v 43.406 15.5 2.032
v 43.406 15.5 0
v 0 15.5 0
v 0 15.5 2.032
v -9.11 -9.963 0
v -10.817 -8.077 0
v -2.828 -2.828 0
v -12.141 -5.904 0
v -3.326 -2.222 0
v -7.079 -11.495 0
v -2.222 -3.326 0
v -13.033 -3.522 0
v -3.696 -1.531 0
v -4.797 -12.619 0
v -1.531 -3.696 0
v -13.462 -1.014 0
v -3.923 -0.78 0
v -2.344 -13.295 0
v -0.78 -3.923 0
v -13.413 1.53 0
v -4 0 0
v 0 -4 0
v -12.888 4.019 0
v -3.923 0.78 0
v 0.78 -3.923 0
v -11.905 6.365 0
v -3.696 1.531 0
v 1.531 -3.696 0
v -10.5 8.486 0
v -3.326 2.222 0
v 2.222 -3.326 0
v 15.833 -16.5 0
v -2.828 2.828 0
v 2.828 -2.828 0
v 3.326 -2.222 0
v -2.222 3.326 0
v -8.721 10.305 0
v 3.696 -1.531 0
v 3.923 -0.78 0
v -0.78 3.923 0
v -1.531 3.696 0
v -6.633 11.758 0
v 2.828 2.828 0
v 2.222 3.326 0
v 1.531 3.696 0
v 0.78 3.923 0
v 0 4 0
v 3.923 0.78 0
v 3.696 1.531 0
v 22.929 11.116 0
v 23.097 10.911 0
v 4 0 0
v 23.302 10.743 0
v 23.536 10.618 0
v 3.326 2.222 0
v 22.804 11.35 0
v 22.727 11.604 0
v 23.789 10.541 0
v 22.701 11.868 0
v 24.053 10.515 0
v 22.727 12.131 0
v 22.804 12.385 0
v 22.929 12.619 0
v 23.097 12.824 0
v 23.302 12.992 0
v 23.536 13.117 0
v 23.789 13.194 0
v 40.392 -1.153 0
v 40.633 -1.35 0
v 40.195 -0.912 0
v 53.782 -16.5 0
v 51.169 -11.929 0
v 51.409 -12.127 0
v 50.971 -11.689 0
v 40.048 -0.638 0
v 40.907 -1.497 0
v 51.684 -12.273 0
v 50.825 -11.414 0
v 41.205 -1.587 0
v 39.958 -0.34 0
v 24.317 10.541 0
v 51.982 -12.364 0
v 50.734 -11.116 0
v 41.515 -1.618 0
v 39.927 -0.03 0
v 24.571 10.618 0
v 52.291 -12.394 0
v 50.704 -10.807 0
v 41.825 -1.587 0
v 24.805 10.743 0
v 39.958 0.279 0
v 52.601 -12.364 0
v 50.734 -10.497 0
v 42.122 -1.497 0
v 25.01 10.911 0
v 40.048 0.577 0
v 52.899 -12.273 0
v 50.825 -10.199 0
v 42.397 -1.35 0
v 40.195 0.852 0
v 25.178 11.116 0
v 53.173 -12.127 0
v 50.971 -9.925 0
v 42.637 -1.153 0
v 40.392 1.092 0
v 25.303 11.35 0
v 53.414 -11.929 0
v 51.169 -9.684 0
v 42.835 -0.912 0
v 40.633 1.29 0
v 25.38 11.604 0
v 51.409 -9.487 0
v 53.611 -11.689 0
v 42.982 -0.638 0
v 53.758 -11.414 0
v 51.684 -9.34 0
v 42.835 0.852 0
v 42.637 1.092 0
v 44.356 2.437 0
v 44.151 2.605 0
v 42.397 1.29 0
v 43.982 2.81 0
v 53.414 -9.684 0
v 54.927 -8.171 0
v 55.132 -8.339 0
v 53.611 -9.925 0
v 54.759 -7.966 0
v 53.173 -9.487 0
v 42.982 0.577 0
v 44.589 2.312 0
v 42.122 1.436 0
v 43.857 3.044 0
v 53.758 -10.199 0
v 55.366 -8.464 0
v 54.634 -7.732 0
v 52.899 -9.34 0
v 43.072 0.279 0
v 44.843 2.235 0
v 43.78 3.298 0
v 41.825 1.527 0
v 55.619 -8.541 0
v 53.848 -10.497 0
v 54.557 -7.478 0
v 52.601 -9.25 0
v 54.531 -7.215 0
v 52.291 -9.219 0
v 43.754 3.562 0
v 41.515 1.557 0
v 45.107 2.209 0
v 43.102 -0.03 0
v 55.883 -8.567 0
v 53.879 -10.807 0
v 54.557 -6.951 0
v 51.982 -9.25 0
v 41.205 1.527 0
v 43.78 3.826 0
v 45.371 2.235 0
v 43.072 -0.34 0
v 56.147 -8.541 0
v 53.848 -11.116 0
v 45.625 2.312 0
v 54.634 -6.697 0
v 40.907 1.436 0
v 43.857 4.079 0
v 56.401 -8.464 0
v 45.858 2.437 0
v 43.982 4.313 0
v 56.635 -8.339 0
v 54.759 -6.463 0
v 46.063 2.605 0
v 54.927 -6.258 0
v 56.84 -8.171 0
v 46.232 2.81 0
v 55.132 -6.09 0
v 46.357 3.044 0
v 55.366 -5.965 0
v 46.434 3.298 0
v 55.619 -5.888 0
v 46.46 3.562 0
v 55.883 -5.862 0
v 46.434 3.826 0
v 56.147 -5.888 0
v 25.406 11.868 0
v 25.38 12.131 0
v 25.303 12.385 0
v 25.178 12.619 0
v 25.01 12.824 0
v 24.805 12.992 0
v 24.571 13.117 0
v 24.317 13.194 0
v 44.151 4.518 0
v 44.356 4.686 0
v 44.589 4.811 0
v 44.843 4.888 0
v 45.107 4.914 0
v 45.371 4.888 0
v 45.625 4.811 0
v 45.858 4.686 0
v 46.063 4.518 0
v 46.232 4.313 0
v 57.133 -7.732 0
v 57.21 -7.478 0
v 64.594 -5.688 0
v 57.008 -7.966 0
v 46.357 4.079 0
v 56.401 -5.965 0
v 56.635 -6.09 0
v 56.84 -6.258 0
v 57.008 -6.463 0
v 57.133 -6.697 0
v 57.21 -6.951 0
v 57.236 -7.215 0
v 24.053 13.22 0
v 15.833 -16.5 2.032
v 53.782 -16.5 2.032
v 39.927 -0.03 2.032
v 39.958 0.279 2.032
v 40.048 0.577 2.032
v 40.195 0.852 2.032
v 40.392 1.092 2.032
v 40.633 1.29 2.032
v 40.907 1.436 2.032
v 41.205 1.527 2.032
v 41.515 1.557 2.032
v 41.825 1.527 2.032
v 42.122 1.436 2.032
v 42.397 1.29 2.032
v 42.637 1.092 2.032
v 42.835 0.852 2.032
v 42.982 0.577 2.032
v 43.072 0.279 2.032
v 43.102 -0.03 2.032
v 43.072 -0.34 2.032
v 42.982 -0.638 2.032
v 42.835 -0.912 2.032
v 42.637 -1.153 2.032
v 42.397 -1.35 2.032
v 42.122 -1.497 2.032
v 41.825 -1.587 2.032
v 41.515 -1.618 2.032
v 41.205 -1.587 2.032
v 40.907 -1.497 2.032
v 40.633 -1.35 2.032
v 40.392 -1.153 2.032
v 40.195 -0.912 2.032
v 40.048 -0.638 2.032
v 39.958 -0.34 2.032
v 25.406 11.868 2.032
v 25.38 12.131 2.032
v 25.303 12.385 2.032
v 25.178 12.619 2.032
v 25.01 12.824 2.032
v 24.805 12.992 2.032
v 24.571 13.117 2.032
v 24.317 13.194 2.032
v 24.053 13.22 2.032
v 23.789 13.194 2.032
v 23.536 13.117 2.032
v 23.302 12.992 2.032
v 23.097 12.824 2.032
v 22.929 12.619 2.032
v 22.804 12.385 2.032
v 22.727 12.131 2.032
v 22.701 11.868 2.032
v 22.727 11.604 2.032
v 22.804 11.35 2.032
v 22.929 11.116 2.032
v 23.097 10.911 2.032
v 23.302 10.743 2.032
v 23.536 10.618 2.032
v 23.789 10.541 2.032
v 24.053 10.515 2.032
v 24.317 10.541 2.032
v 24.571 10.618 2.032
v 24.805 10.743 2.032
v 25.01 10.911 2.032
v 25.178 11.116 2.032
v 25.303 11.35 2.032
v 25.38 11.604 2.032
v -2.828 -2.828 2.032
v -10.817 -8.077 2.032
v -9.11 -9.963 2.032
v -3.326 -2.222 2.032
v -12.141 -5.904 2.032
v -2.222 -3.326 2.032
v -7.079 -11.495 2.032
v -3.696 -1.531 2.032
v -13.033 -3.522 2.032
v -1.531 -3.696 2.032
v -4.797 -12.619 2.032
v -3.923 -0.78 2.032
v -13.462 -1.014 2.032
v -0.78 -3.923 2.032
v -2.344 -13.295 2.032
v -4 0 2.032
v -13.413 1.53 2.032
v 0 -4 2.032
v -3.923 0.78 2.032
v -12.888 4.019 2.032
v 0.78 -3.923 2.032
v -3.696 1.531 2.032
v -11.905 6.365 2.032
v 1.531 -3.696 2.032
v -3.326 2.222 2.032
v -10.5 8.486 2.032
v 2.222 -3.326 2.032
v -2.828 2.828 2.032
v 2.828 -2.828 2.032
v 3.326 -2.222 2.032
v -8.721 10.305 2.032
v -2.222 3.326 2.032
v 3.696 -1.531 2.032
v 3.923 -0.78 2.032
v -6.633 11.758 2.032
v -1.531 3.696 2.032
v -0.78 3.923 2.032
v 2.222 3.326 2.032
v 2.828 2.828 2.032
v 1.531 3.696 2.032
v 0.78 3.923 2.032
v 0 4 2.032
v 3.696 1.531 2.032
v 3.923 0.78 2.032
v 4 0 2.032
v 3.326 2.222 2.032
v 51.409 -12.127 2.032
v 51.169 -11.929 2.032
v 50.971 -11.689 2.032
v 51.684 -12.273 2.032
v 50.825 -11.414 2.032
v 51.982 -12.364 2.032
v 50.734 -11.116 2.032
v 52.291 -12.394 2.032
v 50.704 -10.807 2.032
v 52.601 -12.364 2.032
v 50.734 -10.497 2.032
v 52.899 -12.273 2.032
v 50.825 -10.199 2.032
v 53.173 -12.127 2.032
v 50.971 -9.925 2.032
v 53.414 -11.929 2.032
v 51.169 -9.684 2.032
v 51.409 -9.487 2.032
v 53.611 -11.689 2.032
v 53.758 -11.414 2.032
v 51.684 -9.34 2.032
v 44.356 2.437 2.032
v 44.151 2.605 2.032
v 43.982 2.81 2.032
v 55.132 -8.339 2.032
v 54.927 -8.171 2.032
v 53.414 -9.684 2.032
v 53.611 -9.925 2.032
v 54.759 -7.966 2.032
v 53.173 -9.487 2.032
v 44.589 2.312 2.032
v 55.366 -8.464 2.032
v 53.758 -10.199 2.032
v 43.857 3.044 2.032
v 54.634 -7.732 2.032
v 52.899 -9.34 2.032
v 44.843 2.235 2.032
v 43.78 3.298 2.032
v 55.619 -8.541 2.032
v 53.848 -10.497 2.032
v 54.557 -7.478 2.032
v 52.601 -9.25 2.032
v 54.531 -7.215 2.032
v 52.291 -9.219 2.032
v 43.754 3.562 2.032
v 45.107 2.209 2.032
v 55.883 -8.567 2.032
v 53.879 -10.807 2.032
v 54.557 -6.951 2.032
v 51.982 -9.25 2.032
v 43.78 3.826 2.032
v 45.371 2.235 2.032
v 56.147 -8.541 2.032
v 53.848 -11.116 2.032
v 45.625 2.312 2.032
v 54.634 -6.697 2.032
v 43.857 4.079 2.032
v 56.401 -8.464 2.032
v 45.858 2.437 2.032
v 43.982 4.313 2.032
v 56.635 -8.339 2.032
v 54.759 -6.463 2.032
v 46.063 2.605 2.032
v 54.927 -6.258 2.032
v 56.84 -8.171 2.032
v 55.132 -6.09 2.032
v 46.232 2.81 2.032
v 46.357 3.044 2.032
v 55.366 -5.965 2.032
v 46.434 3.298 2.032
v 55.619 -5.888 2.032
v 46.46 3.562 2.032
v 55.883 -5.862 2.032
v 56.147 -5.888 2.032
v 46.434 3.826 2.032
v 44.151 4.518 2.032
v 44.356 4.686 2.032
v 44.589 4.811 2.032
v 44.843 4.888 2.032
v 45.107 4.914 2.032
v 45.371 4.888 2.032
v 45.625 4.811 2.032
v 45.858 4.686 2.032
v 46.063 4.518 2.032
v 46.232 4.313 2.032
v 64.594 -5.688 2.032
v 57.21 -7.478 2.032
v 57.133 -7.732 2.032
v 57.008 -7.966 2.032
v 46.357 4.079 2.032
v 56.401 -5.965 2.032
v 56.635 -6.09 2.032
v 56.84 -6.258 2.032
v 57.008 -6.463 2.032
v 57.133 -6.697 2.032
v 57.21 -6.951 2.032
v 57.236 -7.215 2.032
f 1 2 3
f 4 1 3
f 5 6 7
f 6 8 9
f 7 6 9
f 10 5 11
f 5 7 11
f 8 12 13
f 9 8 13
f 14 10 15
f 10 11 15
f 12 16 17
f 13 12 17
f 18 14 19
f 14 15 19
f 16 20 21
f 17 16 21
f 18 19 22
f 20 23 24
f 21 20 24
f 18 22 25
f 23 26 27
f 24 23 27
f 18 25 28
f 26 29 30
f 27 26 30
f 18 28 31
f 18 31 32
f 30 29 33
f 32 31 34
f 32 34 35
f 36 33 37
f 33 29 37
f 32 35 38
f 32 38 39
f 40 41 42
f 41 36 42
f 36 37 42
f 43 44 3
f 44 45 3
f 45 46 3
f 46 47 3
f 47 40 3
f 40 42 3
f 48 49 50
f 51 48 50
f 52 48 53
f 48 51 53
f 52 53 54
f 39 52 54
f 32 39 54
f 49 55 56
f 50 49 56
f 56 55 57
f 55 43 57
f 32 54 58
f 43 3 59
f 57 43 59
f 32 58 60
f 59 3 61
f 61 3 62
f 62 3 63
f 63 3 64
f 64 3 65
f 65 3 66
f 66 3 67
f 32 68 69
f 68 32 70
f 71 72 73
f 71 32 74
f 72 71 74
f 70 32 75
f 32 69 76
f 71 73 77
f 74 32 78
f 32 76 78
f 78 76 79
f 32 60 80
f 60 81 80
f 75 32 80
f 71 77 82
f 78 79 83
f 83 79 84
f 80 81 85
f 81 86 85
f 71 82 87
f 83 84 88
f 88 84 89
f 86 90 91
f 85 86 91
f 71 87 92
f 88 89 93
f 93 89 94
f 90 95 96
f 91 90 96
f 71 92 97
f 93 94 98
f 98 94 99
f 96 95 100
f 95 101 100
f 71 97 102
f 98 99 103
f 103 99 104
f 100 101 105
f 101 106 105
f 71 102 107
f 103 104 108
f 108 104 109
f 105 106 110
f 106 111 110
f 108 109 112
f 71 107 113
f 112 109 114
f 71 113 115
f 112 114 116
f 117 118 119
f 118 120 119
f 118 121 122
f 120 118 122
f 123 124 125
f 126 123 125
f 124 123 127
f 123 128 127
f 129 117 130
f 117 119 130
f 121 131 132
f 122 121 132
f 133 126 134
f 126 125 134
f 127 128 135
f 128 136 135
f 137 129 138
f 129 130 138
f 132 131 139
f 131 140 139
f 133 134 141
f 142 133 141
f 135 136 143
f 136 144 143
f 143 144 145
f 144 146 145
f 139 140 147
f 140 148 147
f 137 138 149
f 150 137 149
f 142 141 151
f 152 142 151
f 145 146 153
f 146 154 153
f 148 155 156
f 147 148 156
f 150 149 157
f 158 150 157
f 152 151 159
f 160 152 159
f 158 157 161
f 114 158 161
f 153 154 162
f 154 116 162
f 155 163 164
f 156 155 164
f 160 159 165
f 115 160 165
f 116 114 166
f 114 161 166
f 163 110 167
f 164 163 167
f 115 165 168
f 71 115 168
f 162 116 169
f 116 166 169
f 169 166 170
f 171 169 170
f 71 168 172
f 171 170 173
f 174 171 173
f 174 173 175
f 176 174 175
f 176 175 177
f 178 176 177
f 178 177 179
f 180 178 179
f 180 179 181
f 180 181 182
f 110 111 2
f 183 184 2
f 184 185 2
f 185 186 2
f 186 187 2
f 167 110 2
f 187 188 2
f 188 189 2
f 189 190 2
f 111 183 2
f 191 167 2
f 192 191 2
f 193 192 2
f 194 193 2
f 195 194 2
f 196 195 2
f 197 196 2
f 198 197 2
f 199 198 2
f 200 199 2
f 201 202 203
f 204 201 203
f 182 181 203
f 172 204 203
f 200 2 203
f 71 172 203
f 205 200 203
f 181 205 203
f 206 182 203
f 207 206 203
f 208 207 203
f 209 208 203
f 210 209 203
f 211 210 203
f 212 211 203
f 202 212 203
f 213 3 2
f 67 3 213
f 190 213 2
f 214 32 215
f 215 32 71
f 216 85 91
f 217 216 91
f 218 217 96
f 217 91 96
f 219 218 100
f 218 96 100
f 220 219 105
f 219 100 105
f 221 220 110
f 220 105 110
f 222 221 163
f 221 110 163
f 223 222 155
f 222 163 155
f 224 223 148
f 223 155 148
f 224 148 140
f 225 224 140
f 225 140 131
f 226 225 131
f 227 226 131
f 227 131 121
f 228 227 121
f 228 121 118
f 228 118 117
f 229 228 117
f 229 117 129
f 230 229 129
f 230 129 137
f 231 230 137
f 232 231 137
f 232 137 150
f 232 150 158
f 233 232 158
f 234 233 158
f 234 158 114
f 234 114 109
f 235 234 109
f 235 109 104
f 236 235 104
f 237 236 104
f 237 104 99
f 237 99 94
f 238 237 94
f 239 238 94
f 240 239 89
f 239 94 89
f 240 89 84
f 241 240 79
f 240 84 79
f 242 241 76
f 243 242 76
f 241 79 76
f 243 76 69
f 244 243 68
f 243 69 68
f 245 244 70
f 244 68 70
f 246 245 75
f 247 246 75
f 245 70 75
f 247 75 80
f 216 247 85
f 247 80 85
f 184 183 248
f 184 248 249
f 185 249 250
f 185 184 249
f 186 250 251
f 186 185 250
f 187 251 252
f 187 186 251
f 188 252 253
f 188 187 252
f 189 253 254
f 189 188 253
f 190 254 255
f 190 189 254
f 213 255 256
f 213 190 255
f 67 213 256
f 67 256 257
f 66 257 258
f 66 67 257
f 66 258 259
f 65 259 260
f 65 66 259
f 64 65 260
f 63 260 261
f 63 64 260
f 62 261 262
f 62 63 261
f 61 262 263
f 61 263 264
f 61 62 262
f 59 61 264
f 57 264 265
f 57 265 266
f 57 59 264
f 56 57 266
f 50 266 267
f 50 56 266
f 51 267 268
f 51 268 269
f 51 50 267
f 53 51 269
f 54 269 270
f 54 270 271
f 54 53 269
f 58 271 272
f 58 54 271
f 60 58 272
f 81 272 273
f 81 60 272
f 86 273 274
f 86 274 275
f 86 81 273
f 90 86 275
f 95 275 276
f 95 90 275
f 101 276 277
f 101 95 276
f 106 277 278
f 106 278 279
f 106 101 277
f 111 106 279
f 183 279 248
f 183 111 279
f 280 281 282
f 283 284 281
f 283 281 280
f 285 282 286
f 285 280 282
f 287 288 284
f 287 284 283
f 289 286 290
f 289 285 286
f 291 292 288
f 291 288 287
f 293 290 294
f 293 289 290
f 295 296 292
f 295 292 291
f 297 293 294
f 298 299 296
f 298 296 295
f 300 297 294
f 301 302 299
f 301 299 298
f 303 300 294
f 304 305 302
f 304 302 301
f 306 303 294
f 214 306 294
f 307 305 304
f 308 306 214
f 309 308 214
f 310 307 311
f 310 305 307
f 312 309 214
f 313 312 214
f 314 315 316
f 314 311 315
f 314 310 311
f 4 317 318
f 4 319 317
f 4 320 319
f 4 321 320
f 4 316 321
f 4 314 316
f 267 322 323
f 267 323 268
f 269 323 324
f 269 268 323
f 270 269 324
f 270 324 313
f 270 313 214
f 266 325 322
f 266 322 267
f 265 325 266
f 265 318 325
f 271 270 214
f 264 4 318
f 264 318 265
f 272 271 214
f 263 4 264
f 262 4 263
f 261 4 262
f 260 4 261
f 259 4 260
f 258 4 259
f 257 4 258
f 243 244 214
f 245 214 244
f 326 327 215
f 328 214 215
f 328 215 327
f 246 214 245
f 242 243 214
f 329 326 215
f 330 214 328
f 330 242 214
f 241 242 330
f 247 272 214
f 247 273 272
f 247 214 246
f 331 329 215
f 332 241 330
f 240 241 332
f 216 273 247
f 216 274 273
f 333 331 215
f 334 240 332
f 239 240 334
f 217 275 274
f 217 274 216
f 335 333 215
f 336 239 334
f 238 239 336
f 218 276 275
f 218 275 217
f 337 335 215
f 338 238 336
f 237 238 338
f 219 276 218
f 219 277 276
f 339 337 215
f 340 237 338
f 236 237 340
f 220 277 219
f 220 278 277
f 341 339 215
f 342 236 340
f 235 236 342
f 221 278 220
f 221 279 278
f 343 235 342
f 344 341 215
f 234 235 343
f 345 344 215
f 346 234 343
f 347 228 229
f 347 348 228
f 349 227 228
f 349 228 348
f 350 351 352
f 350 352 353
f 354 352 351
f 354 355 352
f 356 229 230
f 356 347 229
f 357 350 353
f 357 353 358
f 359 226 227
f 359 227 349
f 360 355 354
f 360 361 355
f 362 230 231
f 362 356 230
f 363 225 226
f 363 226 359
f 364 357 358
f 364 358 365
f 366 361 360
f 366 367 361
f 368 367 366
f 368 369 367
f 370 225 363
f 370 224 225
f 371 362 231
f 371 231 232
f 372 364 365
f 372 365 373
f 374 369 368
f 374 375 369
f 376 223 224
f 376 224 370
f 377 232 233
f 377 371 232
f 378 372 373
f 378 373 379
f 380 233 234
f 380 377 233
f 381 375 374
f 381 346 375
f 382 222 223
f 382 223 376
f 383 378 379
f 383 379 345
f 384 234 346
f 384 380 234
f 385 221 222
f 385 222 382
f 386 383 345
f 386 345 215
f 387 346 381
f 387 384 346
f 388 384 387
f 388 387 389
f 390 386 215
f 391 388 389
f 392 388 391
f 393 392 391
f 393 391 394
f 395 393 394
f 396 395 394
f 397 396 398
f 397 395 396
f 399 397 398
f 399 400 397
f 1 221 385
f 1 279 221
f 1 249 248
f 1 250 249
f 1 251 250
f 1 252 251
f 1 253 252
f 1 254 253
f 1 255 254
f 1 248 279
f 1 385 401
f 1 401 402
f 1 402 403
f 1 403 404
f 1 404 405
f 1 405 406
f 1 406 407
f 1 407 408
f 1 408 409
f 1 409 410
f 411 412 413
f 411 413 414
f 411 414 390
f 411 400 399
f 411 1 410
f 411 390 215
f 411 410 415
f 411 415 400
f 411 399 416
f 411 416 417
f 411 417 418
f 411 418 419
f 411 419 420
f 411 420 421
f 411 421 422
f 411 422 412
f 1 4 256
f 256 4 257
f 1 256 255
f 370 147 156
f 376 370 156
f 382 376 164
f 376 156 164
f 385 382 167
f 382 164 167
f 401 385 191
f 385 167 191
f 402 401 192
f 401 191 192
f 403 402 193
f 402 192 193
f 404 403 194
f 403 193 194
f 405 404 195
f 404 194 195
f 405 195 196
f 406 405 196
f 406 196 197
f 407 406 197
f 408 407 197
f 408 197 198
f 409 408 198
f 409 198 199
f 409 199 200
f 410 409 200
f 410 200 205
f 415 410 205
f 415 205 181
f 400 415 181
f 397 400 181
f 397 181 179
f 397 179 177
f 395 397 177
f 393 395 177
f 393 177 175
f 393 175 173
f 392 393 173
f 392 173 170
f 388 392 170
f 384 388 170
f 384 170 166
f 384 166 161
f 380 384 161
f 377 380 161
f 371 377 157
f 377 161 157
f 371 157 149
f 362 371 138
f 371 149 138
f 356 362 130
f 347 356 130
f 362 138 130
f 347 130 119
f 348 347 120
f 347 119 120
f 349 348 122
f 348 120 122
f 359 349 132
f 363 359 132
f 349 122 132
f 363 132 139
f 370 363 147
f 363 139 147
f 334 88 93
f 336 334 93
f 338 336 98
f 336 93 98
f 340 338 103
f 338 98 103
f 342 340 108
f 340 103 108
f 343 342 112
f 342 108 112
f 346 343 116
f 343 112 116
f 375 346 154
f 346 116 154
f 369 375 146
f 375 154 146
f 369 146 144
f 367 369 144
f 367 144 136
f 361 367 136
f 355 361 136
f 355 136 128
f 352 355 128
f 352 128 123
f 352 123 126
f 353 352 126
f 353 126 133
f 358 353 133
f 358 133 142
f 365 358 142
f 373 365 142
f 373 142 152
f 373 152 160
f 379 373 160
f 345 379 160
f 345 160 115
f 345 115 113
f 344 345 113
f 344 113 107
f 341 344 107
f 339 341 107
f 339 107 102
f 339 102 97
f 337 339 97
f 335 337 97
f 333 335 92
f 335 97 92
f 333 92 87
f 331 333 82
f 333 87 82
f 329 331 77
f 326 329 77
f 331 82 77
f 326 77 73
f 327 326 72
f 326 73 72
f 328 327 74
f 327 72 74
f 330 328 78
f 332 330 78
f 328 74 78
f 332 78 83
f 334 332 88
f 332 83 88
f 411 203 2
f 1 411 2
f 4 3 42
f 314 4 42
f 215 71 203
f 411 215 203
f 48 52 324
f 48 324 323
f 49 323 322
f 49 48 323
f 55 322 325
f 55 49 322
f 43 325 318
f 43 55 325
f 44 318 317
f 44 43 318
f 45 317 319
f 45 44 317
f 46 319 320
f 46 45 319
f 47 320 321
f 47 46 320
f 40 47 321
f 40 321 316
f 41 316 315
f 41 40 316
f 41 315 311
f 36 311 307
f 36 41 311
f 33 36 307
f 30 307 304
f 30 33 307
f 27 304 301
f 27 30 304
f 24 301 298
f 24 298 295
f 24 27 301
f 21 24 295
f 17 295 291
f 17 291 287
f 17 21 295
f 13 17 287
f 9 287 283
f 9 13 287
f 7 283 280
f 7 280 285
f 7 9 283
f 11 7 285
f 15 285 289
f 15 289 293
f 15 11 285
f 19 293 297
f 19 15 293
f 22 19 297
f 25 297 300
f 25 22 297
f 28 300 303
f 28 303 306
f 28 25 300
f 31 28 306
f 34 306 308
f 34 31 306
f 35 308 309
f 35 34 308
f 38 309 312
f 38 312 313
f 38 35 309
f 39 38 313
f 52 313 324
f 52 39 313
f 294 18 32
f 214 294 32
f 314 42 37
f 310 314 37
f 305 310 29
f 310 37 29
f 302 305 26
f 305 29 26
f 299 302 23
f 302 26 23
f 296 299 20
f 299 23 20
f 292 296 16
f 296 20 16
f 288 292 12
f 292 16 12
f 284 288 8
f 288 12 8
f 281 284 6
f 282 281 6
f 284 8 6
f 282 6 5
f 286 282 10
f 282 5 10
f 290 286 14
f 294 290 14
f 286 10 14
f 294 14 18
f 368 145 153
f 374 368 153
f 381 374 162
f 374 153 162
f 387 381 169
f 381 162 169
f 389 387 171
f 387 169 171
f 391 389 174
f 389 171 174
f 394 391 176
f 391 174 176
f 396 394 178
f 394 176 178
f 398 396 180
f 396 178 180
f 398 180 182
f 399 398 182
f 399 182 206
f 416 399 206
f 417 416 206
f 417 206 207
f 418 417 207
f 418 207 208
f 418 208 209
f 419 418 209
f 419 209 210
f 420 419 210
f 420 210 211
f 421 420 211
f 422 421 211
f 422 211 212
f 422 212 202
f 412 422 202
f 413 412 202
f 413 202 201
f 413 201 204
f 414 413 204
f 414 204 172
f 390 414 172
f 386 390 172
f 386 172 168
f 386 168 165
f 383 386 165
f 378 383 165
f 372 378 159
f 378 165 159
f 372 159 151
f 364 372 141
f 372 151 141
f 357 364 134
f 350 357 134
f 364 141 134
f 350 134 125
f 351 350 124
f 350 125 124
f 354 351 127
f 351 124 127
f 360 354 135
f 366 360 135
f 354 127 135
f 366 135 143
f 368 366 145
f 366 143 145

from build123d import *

# Parameters (mm, degrees)
SKETCH2_R           = 4
SKETCH2_R_2         = 1.35255
BOSS_EXTRUDE1_DEPTH = 2.032
SKETCH5_R           = 1.5875
SKETCH5_R_2         = 1.35255
CUT_EXTRUDE1_DEPTH  = 3.032


with BuildPart() as part:
    # Sketch2 → Boss-Extrude1 (new body)
    with BuildSketch(Plane.XY):
        with BuildLine():
            Line((64.594184148, -5.687884281), (43.406299867, 15.5))
            Line((43.406299867, 15.5), (0, 15.5))
            Line((0, 15.5), (-6.633092705, 11.758064516))
            ThreePointArc((-6.633092705, 11.758064516), (-13.306426587, -2.277940187), (-2.344250399, -13.294904666))
            Line((-2.344250399, -13.294904666), (15.832748501, -16.5))
            Line((15.832748501, -16.5), (53.78206843, -16.5))
            Line((53.78206843, -16.5), (64.594184148, -5.687884281))
        make_face()
        Circle(SKETCH2_R, mode=Mode.SUBTRACT)
        with Locations((24.053244616, 11.867587507)):
            Circle(SKETCH2_R_2, mode=Mode.SUBTRACT)
    extrude(amount=BOSS_EXTRUDE1_DEPTH)

    # Sketch5 → Cut-Extrude1 (cut, through all)
    with BuildSketch(Plane(origin=(0, 0, 0), x_dir=(-1, 0, 0), z_dir=(0, 0, -1))):
        with Locations((-41.514925917, -0.030322925)):
            Circle(SKETCH5_R)
        with Locations((-52.291233263, -10.80663027)):
            Circle(SKETCH5_R)
        with Locations((-45.107028366, 3.561779523)):
            Circle(SKETCH5_R_2)
        with Locations((-55.883335711, -7.214527822)):
            Circle(SKETCH5_R_2)
    extrude(amount=-CUT_EXTRUDE1_DEPTH, mode=Mode.SUBTRACT)


solid = part.part
